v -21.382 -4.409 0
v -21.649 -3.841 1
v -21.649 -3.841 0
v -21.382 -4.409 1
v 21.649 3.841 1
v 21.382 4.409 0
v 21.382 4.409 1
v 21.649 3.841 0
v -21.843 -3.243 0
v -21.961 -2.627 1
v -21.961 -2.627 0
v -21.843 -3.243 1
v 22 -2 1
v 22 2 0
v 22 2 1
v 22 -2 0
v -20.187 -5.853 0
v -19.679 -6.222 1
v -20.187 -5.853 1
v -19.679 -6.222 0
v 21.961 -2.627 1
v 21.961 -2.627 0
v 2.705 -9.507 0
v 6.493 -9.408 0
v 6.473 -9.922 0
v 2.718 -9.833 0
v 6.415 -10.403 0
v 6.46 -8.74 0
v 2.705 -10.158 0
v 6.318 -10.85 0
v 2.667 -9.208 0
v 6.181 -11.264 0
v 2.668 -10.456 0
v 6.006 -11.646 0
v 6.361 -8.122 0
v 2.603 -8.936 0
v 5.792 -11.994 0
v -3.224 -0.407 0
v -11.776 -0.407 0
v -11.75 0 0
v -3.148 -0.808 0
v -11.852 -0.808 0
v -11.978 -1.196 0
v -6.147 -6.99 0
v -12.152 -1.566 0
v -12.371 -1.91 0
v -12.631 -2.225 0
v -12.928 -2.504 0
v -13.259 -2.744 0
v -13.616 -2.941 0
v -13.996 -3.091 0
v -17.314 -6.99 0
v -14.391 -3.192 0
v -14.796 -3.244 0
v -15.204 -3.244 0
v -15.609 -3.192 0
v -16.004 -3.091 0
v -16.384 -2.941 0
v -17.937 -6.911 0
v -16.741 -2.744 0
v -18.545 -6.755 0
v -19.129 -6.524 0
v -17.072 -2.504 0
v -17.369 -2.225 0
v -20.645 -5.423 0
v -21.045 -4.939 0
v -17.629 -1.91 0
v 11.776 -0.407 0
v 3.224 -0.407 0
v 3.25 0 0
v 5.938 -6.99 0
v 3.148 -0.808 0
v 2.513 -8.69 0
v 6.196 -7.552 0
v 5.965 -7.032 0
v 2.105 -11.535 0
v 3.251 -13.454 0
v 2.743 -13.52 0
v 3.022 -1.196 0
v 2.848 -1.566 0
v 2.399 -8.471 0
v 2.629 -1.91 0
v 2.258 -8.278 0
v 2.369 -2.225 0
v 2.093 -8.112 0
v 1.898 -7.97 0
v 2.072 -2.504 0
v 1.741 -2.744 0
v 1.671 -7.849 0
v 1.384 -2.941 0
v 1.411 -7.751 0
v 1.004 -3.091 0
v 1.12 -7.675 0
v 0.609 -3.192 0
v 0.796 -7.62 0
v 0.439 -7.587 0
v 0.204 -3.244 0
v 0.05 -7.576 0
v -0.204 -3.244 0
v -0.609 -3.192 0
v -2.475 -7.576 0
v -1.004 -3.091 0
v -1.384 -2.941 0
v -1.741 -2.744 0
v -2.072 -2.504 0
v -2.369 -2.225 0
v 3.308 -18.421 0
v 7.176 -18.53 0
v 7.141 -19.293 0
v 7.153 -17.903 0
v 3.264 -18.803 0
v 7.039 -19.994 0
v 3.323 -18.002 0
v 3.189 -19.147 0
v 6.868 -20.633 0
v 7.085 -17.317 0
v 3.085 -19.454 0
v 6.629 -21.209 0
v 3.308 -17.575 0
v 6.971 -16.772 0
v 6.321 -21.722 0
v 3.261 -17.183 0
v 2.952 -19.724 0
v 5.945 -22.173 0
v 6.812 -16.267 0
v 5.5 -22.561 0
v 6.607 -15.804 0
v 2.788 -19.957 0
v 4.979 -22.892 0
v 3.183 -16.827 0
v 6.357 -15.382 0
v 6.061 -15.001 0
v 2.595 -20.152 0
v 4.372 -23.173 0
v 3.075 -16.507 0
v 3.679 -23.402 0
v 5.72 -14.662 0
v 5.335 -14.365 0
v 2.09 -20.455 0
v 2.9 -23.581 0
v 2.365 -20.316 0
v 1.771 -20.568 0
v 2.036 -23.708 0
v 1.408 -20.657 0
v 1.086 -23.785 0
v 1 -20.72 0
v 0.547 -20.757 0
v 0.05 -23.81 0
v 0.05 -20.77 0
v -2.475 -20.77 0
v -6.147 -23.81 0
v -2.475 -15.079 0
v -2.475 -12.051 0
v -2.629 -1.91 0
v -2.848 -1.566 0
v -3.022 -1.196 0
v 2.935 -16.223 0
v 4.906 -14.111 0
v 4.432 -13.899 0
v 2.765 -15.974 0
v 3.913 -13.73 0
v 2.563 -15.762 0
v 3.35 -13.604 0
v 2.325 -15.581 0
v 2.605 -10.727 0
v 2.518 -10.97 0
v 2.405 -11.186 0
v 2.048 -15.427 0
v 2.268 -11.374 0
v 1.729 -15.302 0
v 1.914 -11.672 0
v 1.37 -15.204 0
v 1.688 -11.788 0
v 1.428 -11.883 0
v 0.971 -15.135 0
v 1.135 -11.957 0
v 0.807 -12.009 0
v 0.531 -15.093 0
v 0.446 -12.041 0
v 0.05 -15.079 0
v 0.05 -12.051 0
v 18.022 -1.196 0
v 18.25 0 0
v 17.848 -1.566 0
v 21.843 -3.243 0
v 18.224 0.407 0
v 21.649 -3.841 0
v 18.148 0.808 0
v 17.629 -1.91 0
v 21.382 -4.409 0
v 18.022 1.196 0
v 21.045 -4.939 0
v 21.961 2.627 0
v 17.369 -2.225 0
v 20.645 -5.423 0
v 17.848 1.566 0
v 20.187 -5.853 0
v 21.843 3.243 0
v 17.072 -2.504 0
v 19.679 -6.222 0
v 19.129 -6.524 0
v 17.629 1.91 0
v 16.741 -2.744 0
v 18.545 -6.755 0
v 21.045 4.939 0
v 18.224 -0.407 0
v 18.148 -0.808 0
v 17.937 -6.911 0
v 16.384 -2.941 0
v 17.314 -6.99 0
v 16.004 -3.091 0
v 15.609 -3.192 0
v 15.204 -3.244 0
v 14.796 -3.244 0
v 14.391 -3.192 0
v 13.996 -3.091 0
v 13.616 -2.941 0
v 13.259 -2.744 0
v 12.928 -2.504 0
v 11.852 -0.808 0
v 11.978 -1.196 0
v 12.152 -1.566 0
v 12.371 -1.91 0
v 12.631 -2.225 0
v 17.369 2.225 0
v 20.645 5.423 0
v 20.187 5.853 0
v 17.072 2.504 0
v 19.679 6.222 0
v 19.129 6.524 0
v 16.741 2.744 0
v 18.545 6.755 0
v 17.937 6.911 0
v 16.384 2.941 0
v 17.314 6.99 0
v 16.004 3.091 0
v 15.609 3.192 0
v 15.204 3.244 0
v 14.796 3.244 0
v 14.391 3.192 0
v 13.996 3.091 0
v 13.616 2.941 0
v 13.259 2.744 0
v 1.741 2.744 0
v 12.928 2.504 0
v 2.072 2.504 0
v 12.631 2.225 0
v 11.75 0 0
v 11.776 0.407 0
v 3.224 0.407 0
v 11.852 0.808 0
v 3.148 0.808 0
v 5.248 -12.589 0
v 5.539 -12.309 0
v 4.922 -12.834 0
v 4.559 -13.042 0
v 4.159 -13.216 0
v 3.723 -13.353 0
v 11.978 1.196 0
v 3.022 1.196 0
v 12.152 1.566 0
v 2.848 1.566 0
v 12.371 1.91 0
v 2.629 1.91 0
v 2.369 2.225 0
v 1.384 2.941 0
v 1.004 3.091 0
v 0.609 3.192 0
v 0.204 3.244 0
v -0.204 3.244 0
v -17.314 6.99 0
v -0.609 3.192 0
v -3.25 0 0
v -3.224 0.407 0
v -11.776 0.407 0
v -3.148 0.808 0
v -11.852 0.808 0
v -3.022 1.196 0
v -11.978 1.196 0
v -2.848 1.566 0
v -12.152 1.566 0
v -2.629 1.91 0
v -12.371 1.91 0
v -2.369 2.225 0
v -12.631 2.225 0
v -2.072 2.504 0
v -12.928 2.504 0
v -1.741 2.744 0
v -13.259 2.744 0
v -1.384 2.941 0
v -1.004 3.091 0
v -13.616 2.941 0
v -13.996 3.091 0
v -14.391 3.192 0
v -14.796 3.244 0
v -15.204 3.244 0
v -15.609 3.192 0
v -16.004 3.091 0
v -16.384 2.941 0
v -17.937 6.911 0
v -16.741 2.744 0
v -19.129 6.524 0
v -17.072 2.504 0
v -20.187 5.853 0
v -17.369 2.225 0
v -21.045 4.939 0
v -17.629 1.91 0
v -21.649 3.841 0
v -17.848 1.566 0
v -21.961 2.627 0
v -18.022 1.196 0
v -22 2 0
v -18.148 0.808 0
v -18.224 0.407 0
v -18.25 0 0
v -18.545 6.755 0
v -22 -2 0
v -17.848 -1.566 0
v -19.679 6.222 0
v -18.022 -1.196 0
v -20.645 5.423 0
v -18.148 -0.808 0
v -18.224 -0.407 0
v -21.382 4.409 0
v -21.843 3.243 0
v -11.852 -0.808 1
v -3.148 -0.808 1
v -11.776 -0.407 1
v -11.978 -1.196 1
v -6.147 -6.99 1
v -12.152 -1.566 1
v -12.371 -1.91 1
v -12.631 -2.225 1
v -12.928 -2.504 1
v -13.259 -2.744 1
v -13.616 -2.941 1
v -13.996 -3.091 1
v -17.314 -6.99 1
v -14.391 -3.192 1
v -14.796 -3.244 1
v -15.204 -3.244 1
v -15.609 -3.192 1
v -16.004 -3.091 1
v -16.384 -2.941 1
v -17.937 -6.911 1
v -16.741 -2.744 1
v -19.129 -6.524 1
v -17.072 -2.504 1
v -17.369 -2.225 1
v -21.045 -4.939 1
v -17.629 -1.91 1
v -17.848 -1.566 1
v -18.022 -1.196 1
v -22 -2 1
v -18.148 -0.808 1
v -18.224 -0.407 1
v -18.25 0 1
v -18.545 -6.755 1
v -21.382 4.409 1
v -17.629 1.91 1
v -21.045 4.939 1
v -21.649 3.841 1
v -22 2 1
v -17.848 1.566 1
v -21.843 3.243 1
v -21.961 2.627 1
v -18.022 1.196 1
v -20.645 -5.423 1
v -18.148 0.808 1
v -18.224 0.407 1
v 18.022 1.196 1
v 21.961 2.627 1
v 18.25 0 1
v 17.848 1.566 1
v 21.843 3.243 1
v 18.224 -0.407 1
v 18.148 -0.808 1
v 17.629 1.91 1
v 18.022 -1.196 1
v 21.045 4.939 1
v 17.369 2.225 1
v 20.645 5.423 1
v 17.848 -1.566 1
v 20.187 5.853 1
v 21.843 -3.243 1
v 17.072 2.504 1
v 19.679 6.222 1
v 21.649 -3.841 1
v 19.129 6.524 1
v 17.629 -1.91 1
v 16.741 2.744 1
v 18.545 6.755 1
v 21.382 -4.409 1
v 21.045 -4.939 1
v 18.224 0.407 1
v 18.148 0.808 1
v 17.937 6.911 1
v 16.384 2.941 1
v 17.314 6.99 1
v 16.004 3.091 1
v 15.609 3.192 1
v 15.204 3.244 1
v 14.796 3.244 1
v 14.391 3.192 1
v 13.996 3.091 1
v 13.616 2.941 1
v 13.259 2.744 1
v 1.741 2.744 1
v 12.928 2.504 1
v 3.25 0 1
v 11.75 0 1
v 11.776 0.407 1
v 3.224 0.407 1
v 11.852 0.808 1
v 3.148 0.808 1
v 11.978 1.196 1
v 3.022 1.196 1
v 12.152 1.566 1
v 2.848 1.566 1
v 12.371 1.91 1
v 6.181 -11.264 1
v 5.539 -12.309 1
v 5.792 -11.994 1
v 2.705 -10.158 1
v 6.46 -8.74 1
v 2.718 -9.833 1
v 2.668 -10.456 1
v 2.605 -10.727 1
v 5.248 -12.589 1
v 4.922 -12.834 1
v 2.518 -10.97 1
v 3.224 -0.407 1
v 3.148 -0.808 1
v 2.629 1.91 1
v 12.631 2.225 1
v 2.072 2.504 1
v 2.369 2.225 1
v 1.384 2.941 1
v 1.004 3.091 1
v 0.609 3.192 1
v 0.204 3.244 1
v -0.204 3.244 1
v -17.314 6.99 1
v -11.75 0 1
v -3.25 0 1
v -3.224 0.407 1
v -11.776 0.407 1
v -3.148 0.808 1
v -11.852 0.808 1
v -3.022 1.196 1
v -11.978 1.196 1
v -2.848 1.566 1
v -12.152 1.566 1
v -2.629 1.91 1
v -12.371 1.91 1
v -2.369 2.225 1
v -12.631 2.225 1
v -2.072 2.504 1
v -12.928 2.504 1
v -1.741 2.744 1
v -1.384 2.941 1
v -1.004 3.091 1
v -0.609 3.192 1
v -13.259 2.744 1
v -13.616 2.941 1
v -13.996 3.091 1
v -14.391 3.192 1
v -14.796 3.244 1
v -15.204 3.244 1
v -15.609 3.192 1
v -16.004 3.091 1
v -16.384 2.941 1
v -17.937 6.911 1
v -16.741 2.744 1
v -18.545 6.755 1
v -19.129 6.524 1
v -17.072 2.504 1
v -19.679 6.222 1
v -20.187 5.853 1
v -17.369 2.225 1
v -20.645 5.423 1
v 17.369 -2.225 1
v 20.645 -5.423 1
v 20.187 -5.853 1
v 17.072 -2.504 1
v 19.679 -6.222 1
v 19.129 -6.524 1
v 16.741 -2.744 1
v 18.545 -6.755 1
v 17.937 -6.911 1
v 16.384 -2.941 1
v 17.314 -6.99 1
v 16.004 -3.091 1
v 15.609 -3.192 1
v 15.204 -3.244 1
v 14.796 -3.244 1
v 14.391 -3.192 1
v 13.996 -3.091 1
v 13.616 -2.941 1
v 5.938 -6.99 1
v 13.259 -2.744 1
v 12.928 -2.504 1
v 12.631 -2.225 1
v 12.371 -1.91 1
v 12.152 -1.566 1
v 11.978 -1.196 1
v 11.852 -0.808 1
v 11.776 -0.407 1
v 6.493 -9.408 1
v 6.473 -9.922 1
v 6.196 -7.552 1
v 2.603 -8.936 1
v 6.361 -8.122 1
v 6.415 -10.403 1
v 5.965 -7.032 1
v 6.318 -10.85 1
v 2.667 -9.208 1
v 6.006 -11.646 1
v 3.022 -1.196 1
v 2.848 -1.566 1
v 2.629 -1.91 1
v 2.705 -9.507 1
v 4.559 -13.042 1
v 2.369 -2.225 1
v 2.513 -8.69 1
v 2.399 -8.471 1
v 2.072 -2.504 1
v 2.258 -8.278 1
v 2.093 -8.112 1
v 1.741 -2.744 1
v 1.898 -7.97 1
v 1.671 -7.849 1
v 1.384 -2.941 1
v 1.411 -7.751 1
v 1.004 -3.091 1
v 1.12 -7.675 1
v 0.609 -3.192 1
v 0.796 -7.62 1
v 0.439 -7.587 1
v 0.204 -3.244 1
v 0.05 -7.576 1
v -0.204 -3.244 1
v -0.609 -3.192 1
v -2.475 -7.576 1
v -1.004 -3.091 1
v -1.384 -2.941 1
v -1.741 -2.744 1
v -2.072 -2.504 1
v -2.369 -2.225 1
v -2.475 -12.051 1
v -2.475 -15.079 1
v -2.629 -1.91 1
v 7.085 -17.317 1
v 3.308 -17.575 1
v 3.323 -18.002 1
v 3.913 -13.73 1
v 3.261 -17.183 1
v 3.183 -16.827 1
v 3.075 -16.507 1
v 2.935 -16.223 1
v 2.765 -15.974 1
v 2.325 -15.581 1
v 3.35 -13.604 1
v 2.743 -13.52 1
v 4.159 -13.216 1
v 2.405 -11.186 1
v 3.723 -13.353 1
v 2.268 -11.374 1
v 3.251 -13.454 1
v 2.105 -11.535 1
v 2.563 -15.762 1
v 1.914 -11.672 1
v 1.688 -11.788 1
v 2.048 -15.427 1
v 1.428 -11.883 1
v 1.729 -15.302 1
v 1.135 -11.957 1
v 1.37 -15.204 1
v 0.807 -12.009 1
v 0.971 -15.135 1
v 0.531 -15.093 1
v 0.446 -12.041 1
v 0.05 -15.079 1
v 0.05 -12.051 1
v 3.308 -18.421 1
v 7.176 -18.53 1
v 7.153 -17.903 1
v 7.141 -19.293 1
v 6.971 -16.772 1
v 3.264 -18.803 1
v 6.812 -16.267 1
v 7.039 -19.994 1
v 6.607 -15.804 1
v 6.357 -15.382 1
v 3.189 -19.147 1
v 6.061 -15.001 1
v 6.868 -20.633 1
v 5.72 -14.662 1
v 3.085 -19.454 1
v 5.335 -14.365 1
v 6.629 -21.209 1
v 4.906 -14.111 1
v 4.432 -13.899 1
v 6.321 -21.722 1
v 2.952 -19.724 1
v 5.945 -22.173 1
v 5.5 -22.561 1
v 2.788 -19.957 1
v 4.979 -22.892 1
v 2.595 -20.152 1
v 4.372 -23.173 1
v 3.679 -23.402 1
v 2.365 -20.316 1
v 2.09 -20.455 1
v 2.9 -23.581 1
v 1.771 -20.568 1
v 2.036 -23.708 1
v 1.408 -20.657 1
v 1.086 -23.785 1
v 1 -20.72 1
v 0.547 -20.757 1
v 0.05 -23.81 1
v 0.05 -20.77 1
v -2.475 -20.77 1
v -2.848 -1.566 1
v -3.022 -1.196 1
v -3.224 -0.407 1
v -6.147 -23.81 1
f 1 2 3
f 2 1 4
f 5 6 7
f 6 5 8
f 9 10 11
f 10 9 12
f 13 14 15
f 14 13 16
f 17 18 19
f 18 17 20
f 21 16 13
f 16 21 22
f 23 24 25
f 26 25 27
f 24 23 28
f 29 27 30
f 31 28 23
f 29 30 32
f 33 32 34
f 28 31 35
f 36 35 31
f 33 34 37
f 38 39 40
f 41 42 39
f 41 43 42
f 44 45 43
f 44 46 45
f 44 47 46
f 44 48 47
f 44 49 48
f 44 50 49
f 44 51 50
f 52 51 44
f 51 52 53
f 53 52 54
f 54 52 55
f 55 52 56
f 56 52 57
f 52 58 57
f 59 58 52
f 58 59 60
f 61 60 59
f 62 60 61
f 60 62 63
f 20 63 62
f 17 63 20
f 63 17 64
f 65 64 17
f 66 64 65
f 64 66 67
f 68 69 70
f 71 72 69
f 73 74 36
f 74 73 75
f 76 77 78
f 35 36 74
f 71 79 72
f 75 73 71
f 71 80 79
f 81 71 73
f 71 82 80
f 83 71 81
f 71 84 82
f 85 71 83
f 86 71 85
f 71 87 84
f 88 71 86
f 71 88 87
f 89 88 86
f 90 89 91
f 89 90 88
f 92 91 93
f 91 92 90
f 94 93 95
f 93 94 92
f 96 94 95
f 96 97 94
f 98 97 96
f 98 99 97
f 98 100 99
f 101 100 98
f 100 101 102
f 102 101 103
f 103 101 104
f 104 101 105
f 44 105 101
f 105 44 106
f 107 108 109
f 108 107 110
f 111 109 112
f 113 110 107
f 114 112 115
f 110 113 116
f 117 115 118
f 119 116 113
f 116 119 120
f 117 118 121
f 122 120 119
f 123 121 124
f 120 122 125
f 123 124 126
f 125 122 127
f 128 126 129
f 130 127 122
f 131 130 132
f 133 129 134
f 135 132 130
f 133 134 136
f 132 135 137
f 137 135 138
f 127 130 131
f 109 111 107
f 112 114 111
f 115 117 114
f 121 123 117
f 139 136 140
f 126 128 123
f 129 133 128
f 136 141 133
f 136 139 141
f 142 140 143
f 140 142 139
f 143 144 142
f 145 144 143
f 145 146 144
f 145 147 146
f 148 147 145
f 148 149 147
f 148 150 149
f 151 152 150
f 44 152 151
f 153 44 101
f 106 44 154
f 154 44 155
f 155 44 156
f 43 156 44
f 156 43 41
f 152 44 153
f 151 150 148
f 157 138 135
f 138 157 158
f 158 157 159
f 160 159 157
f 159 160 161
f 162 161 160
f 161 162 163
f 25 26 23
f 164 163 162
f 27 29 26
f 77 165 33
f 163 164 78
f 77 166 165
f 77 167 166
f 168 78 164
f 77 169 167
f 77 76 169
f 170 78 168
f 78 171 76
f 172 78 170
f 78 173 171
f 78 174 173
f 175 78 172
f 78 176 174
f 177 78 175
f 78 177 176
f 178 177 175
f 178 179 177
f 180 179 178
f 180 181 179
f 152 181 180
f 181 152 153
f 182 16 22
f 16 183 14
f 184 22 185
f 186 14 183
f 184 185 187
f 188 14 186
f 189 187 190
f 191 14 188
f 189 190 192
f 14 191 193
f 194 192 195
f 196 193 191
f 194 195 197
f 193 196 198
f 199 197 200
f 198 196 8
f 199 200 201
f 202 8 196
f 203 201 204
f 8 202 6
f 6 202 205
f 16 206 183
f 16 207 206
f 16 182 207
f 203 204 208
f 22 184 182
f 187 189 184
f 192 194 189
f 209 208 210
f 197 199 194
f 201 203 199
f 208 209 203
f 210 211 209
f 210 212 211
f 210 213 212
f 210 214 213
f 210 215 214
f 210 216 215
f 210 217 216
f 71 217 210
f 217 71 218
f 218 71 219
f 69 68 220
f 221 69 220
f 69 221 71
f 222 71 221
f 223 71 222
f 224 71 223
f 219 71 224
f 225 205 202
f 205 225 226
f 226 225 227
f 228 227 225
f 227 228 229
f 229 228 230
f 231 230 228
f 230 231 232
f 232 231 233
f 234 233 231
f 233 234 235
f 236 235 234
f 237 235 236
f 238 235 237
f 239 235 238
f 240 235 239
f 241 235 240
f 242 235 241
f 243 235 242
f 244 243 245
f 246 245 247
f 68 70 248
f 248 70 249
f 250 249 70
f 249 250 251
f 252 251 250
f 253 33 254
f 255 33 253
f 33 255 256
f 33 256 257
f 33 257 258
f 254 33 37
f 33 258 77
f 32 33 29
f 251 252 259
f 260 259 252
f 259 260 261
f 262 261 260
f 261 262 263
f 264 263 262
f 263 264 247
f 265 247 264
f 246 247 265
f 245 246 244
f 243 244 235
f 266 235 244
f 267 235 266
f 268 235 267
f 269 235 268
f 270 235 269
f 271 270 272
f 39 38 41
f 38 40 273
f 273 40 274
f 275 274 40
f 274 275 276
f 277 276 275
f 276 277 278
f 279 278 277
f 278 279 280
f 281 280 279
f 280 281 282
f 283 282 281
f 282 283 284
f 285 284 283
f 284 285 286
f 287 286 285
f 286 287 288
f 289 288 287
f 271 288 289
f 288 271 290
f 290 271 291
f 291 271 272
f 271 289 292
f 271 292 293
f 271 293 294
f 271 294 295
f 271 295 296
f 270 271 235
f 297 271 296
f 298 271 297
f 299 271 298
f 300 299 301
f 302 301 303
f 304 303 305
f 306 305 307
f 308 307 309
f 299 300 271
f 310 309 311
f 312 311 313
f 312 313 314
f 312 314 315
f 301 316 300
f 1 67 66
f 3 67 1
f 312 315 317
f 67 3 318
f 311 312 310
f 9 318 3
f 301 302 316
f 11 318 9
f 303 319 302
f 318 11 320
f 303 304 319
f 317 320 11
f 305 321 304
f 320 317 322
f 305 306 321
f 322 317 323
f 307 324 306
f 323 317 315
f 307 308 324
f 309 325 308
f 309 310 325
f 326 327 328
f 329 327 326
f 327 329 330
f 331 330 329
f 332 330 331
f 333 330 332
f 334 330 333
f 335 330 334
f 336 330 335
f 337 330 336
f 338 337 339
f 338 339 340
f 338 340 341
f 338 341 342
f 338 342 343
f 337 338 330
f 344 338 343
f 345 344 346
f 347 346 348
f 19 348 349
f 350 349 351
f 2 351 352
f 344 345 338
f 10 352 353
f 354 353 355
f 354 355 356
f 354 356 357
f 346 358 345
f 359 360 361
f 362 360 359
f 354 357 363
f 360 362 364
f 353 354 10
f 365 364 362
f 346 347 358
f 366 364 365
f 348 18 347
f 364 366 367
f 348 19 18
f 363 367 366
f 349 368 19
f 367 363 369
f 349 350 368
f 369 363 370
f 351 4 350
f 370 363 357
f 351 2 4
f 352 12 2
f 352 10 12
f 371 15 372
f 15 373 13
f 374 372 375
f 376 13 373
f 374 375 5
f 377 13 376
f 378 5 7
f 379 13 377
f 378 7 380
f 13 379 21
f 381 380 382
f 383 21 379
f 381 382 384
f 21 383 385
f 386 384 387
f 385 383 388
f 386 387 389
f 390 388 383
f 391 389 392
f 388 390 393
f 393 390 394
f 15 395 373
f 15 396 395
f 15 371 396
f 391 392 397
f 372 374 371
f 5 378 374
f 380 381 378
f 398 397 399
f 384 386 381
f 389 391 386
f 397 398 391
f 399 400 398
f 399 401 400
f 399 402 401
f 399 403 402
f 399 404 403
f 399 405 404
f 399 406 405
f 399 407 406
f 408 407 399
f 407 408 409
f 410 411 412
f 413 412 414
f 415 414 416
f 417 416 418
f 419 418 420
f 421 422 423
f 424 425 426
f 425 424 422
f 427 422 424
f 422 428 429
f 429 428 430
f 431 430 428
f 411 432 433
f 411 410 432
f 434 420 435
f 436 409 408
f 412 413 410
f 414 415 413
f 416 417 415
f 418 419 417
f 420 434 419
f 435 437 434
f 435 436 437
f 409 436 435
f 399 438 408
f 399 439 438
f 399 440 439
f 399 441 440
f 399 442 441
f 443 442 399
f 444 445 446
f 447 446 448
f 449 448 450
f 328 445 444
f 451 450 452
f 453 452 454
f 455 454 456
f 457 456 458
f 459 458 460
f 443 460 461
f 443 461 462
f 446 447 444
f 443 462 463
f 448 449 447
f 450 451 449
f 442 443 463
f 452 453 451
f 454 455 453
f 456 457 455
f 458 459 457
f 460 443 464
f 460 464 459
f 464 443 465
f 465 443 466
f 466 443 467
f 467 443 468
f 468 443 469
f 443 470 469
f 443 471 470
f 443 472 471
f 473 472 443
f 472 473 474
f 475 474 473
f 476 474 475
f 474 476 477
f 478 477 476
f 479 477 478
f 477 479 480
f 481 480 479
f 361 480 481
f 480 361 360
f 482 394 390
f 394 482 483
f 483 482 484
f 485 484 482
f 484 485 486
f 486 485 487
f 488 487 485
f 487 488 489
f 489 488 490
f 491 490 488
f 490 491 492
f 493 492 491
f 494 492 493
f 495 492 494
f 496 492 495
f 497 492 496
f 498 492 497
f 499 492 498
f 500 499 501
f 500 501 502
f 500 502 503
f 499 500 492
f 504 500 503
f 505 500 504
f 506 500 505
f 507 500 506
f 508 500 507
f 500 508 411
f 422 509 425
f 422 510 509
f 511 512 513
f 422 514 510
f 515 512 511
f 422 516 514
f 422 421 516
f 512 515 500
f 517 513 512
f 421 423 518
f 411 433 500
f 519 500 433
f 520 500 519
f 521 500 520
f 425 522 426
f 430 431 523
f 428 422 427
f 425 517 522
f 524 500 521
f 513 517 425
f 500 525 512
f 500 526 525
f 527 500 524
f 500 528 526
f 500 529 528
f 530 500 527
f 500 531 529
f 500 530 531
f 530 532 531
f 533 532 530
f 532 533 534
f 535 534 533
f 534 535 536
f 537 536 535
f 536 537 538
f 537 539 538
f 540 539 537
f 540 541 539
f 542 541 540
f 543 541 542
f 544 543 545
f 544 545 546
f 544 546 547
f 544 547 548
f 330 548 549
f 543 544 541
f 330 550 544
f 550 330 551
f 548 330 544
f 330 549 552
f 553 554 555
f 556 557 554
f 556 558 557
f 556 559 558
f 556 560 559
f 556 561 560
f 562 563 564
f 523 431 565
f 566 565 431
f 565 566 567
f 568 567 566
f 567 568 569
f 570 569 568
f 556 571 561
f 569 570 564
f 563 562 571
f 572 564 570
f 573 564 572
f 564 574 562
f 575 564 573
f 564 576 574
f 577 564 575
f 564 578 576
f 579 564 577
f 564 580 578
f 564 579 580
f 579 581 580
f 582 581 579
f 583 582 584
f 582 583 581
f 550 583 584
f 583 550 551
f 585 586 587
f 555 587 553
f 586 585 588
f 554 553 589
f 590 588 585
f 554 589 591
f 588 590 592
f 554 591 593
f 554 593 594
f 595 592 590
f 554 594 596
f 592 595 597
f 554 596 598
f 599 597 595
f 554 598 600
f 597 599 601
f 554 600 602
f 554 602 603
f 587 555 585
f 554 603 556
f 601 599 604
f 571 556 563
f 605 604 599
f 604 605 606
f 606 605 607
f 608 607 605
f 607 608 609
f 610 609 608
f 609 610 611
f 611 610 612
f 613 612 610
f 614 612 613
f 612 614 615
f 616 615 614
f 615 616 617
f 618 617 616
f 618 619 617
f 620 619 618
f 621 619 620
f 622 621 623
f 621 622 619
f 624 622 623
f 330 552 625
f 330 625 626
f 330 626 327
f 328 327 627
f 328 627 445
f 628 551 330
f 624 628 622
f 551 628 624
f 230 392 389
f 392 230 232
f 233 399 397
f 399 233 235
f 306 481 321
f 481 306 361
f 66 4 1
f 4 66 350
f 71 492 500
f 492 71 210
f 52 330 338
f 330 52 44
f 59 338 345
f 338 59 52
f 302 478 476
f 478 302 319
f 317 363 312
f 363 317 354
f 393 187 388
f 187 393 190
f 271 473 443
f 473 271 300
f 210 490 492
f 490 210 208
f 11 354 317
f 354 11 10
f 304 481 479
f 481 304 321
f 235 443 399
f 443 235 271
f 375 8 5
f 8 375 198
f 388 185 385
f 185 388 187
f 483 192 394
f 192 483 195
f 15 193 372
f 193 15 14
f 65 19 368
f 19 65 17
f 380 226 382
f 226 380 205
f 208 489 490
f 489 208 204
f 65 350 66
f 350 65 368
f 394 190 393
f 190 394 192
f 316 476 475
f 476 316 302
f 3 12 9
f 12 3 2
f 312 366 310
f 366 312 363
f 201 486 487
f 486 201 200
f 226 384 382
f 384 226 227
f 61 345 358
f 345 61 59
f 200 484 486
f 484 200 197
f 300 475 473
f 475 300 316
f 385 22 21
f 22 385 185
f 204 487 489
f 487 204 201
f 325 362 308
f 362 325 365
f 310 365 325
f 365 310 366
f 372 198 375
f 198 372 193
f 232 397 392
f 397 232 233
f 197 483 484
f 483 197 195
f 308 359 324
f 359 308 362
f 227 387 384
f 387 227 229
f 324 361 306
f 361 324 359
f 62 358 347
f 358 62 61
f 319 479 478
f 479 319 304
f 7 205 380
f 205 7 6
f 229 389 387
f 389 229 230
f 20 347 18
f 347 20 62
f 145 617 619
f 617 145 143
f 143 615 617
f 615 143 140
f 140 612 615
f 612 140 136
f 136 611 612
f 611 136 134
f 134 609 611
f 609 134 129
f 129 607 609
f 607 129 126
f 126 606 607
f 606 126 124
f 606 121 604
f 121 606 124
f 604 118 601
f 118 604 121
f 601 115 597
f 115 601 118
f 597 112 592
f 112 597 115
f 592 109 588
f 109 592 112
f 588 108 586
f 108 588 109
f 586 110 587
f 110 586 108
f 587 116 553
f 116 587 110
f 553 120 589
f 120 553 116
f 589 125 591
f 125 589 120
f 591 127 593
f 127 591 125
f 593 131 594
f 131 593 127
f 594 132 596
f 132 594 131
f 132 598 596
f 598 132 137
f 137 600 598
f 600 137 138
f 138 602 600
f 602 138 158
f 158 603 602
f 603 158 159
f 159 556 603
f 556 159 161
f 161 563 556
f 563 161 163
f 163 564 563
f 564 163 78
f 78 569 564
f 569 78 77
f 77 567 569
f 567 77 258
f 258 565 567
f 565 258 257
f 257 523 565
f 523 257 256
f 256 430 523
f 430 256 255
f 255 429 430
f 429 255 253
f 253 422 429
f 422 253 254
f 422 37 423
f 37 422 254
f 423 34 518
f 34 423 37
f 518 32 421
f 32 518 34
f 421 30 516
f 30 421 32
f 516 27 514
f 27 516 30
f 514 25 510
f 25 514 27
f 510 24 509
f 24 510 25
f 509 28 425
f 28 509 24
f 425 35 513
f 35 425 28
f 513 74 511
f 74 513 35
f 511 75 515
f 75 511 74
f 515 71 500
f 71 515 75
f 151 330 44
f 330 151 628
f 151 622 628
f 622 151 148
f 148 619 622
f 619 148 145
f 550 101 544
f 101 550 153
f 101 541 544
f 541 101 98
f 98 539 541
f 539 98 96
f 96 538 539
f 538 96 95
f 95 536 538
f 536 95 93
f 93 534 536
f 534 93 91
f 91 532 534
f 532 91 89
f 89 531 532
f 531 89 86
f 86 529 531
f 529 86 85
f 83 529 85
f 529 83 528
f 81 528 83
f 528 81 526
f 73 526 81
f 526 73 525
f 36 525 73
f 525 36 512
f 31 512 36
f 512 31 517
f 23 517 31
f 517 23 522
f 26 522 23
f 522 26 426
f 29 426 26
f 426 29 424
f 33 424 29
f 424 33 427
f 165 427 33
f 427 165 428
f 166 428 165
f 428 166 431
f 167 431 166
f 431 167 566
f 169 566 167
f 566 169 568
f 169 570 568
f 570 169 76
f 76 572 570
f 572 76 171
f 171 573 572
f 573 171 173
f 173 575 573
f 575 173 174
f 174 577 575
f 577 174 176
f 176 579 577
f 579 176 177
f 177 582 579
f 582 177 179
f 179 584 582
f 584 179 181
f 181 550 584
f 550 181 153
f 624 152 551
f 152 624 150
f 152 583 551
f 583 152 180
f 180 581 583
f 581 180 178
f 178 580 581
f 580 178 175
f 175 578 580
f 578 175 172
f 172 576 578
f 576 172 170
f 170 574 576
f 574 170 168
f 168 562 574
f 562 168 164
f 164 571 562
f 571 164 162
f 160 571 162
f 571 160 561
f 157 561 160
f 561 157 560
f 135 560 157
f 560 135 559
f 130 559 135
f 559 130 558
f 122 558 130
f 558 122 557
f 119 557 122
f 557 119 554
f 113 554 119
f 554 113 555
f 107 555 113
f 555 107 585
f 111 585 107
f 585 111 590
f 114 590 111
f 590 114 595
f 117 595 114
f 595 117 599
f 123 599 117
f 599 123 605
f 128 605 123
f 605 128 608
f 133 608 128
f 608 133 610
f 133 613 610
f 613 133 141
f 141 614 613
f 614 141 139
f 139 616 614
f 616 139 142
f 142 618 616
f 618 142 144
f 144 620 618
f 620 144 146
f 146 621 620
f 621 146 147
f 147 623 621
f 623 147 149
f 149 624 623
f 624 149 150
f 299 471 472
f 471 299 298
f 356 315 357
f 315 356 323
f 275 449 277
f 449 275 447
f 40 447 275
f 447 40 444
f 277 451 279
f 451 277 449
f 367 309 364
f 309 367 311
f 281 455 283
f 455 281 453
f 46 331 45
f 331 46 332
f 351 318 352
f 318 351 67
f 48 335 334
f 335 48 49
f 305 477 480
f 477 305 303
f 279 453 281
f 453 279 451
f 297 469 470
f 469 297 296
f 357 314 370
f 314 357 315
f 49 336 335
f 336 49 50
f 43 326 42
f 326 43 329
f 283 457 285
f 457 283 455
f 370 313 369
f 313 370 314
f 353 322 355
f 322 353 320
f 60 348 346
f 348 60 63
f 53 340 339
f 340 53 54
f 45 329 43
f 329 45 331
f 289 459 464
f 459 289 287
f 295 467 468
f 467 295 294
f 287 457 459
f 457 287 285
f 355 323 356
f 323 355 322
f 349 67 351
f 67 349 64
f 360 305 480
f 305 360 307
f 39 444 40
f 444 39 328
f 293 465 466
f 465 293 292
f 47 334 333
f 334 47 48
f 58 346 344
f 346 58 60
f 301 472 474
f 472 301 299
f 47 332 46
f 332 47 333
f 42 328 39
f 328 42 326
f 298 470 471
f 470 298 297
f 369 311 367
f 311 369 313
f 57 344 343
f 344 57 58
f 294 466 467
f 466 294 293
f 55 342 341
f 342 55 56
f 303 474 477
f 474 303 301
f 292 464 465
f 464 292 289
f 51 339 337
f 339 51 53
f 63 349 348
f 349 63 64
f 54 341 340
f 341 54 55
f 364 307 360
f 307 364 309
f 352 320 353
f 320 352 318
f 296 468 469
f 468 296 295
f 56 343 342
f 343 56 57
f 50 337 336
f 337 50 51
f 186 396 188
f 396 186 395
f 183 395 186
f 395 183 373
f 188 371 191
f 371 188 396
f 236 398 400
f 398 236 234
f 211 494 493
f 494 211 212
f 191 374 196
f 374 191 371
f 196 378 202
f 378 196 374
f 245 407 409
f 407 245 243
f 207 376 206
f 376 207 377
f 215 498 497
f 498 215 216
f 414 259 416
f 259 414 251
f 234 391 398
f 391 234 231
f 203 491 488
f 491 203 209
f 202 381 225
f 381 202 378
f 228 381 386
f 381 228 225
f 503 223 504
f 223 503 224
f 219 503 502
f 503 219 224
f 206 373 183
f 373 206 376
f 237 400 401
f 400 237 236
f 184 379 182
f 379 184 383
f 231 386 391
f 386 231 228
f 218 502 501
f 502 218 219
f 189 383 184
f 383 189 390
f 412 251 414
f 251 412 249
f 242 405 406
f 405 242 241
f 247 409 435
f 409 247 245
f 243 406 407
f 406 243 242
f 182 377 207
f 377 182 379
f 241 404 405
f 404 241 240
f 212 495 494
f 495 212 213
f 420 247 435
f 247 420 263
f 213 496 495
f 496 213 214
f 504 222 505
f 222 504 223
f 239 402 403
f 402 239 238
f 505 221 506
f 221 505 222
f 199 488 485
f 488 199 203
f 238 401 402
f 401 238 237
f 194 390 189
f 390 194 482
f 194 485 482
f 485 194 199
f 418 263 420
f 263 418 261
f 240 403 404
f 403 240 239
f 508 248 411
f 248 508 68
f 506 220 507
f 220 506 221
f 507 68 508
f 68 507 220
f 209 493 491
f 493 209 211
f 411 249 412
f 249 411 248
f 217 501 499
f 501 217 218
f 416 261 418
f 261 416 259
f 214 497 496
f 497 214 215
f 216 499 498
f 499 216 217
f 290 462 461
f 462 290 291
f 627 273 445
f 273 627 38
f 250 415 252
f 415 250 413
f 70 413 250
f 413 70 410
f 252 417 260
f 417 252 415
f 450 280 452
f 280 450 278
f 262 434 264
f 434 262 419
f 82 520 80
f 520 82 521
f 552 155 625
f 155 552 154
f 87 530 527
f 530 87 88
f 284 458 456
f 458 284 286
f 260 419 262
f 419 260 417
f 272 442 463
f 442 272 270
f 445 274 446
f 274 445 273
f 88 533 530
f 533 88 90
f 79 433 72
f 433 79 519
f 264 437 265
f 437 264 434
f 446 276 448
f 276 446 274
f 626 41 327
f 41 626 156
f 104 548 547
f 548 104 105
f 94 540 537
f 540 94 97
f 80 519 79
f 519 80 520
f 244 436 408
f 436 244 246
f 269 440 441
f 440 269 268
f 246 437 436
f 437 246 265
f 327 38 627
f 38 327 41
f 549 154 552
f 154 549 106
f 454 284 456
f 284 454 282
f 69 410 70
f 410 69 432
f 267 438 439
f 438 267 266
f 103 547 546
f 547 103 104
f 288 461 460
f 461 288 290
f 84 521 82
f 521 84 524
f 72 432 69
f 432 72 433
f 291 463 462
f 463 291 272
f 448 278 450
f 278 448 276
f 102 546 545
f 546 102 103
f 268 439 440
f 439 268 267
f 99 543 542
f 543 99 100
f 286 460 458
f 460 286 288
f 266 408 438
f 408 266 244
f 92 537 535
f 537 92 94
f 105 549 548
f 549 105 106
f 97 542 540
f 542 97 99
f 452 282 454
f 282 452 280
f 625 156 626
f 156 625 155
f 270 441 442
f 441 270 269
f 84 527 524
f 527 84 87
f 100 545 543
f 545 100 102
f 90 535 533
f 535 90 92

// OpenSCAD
$fn = 50;


difference() {
	union() {
		translate(v = [0, 0, 0]) {
			rotate(a = [0, 0, 0]) {
				hull() {
					translate(v = [-17.0000000000, 2.0000000000, 0]) {
						rotate(a = [0, 0, 0]) {
							translate(v = [0, 0, 0]) {
								rotate(a = [0, 0, 0]) {
									cylinder(h = 1, r = 5);
								}
							}
						}
					}
					translate(v = [17.0000000000, 2.0000000000, 0]) {
						rotate(a = [0, 0, 0]) {
							translate(v = [0, 0, 0]) {
								rotate(a = [0, 0, 0]) {
									cylinder(h = 1, r = 5);
								}
							}
						}
					}
					translate(v = [-17.0000000000, -2.0000000000, 0]) {
						rotate(a = [0, 0, 0]) {
							translate(v = [0, 0, 0]) {
								rotate(a = [0, 0, 0]) {
									cylinder(h = 1, r = 5);
								}
							}
						}
					}
					translate(v = [17.0000000000, -2.0000000000, 0]) {
						rotate(a = [0, 0, 0]) {
							translate(v = [0, 0, 0]) {
								rotate(a = [0, 0, 0]) {
									cylinder(h = 1, r = 5);
								}
							}
						}
					}
				}
			}
		}
		translate(v = [0, -5, 0]) {
			rotate(a = [0, 0, 0]) {
				linear_extrude(height = 1) {
					text(font = "DejaVu Sans Mono:style=Bold", halign = "center", size = 19.0000000000, text = "B", valign = "top");
				}
			}
		}
	}
	union() {
		translate(v = [-15.0000000000, 0.0000000000, -125.0000000000]) {
			rotate(a = [0, 0, 0]) {
				cylinder(h = 250, r = 3.2500000000);
			}
		}
		translate(v = [15.0000000000, 0.0000000000, -125.0000000000]) {
			rotate(a = [0, 0, 0]) {
				cylinder(h = 250, r = 3.2500000000);
			}
		}
		translate(v = [15.0000000000, 0.0000000000, -125.0000000000]) {
			rotate(a = [0, 0, 0]) {
				cylinder(h = 250, r = 3.2500000000);
			}
		}
		translate(v = [0, 0, -125.0000000000]) {
			rotate(a = [0, 0, 0]) {
				cylinder(h = 250, r = 3.2500000000);
			}
		}
	}
}
